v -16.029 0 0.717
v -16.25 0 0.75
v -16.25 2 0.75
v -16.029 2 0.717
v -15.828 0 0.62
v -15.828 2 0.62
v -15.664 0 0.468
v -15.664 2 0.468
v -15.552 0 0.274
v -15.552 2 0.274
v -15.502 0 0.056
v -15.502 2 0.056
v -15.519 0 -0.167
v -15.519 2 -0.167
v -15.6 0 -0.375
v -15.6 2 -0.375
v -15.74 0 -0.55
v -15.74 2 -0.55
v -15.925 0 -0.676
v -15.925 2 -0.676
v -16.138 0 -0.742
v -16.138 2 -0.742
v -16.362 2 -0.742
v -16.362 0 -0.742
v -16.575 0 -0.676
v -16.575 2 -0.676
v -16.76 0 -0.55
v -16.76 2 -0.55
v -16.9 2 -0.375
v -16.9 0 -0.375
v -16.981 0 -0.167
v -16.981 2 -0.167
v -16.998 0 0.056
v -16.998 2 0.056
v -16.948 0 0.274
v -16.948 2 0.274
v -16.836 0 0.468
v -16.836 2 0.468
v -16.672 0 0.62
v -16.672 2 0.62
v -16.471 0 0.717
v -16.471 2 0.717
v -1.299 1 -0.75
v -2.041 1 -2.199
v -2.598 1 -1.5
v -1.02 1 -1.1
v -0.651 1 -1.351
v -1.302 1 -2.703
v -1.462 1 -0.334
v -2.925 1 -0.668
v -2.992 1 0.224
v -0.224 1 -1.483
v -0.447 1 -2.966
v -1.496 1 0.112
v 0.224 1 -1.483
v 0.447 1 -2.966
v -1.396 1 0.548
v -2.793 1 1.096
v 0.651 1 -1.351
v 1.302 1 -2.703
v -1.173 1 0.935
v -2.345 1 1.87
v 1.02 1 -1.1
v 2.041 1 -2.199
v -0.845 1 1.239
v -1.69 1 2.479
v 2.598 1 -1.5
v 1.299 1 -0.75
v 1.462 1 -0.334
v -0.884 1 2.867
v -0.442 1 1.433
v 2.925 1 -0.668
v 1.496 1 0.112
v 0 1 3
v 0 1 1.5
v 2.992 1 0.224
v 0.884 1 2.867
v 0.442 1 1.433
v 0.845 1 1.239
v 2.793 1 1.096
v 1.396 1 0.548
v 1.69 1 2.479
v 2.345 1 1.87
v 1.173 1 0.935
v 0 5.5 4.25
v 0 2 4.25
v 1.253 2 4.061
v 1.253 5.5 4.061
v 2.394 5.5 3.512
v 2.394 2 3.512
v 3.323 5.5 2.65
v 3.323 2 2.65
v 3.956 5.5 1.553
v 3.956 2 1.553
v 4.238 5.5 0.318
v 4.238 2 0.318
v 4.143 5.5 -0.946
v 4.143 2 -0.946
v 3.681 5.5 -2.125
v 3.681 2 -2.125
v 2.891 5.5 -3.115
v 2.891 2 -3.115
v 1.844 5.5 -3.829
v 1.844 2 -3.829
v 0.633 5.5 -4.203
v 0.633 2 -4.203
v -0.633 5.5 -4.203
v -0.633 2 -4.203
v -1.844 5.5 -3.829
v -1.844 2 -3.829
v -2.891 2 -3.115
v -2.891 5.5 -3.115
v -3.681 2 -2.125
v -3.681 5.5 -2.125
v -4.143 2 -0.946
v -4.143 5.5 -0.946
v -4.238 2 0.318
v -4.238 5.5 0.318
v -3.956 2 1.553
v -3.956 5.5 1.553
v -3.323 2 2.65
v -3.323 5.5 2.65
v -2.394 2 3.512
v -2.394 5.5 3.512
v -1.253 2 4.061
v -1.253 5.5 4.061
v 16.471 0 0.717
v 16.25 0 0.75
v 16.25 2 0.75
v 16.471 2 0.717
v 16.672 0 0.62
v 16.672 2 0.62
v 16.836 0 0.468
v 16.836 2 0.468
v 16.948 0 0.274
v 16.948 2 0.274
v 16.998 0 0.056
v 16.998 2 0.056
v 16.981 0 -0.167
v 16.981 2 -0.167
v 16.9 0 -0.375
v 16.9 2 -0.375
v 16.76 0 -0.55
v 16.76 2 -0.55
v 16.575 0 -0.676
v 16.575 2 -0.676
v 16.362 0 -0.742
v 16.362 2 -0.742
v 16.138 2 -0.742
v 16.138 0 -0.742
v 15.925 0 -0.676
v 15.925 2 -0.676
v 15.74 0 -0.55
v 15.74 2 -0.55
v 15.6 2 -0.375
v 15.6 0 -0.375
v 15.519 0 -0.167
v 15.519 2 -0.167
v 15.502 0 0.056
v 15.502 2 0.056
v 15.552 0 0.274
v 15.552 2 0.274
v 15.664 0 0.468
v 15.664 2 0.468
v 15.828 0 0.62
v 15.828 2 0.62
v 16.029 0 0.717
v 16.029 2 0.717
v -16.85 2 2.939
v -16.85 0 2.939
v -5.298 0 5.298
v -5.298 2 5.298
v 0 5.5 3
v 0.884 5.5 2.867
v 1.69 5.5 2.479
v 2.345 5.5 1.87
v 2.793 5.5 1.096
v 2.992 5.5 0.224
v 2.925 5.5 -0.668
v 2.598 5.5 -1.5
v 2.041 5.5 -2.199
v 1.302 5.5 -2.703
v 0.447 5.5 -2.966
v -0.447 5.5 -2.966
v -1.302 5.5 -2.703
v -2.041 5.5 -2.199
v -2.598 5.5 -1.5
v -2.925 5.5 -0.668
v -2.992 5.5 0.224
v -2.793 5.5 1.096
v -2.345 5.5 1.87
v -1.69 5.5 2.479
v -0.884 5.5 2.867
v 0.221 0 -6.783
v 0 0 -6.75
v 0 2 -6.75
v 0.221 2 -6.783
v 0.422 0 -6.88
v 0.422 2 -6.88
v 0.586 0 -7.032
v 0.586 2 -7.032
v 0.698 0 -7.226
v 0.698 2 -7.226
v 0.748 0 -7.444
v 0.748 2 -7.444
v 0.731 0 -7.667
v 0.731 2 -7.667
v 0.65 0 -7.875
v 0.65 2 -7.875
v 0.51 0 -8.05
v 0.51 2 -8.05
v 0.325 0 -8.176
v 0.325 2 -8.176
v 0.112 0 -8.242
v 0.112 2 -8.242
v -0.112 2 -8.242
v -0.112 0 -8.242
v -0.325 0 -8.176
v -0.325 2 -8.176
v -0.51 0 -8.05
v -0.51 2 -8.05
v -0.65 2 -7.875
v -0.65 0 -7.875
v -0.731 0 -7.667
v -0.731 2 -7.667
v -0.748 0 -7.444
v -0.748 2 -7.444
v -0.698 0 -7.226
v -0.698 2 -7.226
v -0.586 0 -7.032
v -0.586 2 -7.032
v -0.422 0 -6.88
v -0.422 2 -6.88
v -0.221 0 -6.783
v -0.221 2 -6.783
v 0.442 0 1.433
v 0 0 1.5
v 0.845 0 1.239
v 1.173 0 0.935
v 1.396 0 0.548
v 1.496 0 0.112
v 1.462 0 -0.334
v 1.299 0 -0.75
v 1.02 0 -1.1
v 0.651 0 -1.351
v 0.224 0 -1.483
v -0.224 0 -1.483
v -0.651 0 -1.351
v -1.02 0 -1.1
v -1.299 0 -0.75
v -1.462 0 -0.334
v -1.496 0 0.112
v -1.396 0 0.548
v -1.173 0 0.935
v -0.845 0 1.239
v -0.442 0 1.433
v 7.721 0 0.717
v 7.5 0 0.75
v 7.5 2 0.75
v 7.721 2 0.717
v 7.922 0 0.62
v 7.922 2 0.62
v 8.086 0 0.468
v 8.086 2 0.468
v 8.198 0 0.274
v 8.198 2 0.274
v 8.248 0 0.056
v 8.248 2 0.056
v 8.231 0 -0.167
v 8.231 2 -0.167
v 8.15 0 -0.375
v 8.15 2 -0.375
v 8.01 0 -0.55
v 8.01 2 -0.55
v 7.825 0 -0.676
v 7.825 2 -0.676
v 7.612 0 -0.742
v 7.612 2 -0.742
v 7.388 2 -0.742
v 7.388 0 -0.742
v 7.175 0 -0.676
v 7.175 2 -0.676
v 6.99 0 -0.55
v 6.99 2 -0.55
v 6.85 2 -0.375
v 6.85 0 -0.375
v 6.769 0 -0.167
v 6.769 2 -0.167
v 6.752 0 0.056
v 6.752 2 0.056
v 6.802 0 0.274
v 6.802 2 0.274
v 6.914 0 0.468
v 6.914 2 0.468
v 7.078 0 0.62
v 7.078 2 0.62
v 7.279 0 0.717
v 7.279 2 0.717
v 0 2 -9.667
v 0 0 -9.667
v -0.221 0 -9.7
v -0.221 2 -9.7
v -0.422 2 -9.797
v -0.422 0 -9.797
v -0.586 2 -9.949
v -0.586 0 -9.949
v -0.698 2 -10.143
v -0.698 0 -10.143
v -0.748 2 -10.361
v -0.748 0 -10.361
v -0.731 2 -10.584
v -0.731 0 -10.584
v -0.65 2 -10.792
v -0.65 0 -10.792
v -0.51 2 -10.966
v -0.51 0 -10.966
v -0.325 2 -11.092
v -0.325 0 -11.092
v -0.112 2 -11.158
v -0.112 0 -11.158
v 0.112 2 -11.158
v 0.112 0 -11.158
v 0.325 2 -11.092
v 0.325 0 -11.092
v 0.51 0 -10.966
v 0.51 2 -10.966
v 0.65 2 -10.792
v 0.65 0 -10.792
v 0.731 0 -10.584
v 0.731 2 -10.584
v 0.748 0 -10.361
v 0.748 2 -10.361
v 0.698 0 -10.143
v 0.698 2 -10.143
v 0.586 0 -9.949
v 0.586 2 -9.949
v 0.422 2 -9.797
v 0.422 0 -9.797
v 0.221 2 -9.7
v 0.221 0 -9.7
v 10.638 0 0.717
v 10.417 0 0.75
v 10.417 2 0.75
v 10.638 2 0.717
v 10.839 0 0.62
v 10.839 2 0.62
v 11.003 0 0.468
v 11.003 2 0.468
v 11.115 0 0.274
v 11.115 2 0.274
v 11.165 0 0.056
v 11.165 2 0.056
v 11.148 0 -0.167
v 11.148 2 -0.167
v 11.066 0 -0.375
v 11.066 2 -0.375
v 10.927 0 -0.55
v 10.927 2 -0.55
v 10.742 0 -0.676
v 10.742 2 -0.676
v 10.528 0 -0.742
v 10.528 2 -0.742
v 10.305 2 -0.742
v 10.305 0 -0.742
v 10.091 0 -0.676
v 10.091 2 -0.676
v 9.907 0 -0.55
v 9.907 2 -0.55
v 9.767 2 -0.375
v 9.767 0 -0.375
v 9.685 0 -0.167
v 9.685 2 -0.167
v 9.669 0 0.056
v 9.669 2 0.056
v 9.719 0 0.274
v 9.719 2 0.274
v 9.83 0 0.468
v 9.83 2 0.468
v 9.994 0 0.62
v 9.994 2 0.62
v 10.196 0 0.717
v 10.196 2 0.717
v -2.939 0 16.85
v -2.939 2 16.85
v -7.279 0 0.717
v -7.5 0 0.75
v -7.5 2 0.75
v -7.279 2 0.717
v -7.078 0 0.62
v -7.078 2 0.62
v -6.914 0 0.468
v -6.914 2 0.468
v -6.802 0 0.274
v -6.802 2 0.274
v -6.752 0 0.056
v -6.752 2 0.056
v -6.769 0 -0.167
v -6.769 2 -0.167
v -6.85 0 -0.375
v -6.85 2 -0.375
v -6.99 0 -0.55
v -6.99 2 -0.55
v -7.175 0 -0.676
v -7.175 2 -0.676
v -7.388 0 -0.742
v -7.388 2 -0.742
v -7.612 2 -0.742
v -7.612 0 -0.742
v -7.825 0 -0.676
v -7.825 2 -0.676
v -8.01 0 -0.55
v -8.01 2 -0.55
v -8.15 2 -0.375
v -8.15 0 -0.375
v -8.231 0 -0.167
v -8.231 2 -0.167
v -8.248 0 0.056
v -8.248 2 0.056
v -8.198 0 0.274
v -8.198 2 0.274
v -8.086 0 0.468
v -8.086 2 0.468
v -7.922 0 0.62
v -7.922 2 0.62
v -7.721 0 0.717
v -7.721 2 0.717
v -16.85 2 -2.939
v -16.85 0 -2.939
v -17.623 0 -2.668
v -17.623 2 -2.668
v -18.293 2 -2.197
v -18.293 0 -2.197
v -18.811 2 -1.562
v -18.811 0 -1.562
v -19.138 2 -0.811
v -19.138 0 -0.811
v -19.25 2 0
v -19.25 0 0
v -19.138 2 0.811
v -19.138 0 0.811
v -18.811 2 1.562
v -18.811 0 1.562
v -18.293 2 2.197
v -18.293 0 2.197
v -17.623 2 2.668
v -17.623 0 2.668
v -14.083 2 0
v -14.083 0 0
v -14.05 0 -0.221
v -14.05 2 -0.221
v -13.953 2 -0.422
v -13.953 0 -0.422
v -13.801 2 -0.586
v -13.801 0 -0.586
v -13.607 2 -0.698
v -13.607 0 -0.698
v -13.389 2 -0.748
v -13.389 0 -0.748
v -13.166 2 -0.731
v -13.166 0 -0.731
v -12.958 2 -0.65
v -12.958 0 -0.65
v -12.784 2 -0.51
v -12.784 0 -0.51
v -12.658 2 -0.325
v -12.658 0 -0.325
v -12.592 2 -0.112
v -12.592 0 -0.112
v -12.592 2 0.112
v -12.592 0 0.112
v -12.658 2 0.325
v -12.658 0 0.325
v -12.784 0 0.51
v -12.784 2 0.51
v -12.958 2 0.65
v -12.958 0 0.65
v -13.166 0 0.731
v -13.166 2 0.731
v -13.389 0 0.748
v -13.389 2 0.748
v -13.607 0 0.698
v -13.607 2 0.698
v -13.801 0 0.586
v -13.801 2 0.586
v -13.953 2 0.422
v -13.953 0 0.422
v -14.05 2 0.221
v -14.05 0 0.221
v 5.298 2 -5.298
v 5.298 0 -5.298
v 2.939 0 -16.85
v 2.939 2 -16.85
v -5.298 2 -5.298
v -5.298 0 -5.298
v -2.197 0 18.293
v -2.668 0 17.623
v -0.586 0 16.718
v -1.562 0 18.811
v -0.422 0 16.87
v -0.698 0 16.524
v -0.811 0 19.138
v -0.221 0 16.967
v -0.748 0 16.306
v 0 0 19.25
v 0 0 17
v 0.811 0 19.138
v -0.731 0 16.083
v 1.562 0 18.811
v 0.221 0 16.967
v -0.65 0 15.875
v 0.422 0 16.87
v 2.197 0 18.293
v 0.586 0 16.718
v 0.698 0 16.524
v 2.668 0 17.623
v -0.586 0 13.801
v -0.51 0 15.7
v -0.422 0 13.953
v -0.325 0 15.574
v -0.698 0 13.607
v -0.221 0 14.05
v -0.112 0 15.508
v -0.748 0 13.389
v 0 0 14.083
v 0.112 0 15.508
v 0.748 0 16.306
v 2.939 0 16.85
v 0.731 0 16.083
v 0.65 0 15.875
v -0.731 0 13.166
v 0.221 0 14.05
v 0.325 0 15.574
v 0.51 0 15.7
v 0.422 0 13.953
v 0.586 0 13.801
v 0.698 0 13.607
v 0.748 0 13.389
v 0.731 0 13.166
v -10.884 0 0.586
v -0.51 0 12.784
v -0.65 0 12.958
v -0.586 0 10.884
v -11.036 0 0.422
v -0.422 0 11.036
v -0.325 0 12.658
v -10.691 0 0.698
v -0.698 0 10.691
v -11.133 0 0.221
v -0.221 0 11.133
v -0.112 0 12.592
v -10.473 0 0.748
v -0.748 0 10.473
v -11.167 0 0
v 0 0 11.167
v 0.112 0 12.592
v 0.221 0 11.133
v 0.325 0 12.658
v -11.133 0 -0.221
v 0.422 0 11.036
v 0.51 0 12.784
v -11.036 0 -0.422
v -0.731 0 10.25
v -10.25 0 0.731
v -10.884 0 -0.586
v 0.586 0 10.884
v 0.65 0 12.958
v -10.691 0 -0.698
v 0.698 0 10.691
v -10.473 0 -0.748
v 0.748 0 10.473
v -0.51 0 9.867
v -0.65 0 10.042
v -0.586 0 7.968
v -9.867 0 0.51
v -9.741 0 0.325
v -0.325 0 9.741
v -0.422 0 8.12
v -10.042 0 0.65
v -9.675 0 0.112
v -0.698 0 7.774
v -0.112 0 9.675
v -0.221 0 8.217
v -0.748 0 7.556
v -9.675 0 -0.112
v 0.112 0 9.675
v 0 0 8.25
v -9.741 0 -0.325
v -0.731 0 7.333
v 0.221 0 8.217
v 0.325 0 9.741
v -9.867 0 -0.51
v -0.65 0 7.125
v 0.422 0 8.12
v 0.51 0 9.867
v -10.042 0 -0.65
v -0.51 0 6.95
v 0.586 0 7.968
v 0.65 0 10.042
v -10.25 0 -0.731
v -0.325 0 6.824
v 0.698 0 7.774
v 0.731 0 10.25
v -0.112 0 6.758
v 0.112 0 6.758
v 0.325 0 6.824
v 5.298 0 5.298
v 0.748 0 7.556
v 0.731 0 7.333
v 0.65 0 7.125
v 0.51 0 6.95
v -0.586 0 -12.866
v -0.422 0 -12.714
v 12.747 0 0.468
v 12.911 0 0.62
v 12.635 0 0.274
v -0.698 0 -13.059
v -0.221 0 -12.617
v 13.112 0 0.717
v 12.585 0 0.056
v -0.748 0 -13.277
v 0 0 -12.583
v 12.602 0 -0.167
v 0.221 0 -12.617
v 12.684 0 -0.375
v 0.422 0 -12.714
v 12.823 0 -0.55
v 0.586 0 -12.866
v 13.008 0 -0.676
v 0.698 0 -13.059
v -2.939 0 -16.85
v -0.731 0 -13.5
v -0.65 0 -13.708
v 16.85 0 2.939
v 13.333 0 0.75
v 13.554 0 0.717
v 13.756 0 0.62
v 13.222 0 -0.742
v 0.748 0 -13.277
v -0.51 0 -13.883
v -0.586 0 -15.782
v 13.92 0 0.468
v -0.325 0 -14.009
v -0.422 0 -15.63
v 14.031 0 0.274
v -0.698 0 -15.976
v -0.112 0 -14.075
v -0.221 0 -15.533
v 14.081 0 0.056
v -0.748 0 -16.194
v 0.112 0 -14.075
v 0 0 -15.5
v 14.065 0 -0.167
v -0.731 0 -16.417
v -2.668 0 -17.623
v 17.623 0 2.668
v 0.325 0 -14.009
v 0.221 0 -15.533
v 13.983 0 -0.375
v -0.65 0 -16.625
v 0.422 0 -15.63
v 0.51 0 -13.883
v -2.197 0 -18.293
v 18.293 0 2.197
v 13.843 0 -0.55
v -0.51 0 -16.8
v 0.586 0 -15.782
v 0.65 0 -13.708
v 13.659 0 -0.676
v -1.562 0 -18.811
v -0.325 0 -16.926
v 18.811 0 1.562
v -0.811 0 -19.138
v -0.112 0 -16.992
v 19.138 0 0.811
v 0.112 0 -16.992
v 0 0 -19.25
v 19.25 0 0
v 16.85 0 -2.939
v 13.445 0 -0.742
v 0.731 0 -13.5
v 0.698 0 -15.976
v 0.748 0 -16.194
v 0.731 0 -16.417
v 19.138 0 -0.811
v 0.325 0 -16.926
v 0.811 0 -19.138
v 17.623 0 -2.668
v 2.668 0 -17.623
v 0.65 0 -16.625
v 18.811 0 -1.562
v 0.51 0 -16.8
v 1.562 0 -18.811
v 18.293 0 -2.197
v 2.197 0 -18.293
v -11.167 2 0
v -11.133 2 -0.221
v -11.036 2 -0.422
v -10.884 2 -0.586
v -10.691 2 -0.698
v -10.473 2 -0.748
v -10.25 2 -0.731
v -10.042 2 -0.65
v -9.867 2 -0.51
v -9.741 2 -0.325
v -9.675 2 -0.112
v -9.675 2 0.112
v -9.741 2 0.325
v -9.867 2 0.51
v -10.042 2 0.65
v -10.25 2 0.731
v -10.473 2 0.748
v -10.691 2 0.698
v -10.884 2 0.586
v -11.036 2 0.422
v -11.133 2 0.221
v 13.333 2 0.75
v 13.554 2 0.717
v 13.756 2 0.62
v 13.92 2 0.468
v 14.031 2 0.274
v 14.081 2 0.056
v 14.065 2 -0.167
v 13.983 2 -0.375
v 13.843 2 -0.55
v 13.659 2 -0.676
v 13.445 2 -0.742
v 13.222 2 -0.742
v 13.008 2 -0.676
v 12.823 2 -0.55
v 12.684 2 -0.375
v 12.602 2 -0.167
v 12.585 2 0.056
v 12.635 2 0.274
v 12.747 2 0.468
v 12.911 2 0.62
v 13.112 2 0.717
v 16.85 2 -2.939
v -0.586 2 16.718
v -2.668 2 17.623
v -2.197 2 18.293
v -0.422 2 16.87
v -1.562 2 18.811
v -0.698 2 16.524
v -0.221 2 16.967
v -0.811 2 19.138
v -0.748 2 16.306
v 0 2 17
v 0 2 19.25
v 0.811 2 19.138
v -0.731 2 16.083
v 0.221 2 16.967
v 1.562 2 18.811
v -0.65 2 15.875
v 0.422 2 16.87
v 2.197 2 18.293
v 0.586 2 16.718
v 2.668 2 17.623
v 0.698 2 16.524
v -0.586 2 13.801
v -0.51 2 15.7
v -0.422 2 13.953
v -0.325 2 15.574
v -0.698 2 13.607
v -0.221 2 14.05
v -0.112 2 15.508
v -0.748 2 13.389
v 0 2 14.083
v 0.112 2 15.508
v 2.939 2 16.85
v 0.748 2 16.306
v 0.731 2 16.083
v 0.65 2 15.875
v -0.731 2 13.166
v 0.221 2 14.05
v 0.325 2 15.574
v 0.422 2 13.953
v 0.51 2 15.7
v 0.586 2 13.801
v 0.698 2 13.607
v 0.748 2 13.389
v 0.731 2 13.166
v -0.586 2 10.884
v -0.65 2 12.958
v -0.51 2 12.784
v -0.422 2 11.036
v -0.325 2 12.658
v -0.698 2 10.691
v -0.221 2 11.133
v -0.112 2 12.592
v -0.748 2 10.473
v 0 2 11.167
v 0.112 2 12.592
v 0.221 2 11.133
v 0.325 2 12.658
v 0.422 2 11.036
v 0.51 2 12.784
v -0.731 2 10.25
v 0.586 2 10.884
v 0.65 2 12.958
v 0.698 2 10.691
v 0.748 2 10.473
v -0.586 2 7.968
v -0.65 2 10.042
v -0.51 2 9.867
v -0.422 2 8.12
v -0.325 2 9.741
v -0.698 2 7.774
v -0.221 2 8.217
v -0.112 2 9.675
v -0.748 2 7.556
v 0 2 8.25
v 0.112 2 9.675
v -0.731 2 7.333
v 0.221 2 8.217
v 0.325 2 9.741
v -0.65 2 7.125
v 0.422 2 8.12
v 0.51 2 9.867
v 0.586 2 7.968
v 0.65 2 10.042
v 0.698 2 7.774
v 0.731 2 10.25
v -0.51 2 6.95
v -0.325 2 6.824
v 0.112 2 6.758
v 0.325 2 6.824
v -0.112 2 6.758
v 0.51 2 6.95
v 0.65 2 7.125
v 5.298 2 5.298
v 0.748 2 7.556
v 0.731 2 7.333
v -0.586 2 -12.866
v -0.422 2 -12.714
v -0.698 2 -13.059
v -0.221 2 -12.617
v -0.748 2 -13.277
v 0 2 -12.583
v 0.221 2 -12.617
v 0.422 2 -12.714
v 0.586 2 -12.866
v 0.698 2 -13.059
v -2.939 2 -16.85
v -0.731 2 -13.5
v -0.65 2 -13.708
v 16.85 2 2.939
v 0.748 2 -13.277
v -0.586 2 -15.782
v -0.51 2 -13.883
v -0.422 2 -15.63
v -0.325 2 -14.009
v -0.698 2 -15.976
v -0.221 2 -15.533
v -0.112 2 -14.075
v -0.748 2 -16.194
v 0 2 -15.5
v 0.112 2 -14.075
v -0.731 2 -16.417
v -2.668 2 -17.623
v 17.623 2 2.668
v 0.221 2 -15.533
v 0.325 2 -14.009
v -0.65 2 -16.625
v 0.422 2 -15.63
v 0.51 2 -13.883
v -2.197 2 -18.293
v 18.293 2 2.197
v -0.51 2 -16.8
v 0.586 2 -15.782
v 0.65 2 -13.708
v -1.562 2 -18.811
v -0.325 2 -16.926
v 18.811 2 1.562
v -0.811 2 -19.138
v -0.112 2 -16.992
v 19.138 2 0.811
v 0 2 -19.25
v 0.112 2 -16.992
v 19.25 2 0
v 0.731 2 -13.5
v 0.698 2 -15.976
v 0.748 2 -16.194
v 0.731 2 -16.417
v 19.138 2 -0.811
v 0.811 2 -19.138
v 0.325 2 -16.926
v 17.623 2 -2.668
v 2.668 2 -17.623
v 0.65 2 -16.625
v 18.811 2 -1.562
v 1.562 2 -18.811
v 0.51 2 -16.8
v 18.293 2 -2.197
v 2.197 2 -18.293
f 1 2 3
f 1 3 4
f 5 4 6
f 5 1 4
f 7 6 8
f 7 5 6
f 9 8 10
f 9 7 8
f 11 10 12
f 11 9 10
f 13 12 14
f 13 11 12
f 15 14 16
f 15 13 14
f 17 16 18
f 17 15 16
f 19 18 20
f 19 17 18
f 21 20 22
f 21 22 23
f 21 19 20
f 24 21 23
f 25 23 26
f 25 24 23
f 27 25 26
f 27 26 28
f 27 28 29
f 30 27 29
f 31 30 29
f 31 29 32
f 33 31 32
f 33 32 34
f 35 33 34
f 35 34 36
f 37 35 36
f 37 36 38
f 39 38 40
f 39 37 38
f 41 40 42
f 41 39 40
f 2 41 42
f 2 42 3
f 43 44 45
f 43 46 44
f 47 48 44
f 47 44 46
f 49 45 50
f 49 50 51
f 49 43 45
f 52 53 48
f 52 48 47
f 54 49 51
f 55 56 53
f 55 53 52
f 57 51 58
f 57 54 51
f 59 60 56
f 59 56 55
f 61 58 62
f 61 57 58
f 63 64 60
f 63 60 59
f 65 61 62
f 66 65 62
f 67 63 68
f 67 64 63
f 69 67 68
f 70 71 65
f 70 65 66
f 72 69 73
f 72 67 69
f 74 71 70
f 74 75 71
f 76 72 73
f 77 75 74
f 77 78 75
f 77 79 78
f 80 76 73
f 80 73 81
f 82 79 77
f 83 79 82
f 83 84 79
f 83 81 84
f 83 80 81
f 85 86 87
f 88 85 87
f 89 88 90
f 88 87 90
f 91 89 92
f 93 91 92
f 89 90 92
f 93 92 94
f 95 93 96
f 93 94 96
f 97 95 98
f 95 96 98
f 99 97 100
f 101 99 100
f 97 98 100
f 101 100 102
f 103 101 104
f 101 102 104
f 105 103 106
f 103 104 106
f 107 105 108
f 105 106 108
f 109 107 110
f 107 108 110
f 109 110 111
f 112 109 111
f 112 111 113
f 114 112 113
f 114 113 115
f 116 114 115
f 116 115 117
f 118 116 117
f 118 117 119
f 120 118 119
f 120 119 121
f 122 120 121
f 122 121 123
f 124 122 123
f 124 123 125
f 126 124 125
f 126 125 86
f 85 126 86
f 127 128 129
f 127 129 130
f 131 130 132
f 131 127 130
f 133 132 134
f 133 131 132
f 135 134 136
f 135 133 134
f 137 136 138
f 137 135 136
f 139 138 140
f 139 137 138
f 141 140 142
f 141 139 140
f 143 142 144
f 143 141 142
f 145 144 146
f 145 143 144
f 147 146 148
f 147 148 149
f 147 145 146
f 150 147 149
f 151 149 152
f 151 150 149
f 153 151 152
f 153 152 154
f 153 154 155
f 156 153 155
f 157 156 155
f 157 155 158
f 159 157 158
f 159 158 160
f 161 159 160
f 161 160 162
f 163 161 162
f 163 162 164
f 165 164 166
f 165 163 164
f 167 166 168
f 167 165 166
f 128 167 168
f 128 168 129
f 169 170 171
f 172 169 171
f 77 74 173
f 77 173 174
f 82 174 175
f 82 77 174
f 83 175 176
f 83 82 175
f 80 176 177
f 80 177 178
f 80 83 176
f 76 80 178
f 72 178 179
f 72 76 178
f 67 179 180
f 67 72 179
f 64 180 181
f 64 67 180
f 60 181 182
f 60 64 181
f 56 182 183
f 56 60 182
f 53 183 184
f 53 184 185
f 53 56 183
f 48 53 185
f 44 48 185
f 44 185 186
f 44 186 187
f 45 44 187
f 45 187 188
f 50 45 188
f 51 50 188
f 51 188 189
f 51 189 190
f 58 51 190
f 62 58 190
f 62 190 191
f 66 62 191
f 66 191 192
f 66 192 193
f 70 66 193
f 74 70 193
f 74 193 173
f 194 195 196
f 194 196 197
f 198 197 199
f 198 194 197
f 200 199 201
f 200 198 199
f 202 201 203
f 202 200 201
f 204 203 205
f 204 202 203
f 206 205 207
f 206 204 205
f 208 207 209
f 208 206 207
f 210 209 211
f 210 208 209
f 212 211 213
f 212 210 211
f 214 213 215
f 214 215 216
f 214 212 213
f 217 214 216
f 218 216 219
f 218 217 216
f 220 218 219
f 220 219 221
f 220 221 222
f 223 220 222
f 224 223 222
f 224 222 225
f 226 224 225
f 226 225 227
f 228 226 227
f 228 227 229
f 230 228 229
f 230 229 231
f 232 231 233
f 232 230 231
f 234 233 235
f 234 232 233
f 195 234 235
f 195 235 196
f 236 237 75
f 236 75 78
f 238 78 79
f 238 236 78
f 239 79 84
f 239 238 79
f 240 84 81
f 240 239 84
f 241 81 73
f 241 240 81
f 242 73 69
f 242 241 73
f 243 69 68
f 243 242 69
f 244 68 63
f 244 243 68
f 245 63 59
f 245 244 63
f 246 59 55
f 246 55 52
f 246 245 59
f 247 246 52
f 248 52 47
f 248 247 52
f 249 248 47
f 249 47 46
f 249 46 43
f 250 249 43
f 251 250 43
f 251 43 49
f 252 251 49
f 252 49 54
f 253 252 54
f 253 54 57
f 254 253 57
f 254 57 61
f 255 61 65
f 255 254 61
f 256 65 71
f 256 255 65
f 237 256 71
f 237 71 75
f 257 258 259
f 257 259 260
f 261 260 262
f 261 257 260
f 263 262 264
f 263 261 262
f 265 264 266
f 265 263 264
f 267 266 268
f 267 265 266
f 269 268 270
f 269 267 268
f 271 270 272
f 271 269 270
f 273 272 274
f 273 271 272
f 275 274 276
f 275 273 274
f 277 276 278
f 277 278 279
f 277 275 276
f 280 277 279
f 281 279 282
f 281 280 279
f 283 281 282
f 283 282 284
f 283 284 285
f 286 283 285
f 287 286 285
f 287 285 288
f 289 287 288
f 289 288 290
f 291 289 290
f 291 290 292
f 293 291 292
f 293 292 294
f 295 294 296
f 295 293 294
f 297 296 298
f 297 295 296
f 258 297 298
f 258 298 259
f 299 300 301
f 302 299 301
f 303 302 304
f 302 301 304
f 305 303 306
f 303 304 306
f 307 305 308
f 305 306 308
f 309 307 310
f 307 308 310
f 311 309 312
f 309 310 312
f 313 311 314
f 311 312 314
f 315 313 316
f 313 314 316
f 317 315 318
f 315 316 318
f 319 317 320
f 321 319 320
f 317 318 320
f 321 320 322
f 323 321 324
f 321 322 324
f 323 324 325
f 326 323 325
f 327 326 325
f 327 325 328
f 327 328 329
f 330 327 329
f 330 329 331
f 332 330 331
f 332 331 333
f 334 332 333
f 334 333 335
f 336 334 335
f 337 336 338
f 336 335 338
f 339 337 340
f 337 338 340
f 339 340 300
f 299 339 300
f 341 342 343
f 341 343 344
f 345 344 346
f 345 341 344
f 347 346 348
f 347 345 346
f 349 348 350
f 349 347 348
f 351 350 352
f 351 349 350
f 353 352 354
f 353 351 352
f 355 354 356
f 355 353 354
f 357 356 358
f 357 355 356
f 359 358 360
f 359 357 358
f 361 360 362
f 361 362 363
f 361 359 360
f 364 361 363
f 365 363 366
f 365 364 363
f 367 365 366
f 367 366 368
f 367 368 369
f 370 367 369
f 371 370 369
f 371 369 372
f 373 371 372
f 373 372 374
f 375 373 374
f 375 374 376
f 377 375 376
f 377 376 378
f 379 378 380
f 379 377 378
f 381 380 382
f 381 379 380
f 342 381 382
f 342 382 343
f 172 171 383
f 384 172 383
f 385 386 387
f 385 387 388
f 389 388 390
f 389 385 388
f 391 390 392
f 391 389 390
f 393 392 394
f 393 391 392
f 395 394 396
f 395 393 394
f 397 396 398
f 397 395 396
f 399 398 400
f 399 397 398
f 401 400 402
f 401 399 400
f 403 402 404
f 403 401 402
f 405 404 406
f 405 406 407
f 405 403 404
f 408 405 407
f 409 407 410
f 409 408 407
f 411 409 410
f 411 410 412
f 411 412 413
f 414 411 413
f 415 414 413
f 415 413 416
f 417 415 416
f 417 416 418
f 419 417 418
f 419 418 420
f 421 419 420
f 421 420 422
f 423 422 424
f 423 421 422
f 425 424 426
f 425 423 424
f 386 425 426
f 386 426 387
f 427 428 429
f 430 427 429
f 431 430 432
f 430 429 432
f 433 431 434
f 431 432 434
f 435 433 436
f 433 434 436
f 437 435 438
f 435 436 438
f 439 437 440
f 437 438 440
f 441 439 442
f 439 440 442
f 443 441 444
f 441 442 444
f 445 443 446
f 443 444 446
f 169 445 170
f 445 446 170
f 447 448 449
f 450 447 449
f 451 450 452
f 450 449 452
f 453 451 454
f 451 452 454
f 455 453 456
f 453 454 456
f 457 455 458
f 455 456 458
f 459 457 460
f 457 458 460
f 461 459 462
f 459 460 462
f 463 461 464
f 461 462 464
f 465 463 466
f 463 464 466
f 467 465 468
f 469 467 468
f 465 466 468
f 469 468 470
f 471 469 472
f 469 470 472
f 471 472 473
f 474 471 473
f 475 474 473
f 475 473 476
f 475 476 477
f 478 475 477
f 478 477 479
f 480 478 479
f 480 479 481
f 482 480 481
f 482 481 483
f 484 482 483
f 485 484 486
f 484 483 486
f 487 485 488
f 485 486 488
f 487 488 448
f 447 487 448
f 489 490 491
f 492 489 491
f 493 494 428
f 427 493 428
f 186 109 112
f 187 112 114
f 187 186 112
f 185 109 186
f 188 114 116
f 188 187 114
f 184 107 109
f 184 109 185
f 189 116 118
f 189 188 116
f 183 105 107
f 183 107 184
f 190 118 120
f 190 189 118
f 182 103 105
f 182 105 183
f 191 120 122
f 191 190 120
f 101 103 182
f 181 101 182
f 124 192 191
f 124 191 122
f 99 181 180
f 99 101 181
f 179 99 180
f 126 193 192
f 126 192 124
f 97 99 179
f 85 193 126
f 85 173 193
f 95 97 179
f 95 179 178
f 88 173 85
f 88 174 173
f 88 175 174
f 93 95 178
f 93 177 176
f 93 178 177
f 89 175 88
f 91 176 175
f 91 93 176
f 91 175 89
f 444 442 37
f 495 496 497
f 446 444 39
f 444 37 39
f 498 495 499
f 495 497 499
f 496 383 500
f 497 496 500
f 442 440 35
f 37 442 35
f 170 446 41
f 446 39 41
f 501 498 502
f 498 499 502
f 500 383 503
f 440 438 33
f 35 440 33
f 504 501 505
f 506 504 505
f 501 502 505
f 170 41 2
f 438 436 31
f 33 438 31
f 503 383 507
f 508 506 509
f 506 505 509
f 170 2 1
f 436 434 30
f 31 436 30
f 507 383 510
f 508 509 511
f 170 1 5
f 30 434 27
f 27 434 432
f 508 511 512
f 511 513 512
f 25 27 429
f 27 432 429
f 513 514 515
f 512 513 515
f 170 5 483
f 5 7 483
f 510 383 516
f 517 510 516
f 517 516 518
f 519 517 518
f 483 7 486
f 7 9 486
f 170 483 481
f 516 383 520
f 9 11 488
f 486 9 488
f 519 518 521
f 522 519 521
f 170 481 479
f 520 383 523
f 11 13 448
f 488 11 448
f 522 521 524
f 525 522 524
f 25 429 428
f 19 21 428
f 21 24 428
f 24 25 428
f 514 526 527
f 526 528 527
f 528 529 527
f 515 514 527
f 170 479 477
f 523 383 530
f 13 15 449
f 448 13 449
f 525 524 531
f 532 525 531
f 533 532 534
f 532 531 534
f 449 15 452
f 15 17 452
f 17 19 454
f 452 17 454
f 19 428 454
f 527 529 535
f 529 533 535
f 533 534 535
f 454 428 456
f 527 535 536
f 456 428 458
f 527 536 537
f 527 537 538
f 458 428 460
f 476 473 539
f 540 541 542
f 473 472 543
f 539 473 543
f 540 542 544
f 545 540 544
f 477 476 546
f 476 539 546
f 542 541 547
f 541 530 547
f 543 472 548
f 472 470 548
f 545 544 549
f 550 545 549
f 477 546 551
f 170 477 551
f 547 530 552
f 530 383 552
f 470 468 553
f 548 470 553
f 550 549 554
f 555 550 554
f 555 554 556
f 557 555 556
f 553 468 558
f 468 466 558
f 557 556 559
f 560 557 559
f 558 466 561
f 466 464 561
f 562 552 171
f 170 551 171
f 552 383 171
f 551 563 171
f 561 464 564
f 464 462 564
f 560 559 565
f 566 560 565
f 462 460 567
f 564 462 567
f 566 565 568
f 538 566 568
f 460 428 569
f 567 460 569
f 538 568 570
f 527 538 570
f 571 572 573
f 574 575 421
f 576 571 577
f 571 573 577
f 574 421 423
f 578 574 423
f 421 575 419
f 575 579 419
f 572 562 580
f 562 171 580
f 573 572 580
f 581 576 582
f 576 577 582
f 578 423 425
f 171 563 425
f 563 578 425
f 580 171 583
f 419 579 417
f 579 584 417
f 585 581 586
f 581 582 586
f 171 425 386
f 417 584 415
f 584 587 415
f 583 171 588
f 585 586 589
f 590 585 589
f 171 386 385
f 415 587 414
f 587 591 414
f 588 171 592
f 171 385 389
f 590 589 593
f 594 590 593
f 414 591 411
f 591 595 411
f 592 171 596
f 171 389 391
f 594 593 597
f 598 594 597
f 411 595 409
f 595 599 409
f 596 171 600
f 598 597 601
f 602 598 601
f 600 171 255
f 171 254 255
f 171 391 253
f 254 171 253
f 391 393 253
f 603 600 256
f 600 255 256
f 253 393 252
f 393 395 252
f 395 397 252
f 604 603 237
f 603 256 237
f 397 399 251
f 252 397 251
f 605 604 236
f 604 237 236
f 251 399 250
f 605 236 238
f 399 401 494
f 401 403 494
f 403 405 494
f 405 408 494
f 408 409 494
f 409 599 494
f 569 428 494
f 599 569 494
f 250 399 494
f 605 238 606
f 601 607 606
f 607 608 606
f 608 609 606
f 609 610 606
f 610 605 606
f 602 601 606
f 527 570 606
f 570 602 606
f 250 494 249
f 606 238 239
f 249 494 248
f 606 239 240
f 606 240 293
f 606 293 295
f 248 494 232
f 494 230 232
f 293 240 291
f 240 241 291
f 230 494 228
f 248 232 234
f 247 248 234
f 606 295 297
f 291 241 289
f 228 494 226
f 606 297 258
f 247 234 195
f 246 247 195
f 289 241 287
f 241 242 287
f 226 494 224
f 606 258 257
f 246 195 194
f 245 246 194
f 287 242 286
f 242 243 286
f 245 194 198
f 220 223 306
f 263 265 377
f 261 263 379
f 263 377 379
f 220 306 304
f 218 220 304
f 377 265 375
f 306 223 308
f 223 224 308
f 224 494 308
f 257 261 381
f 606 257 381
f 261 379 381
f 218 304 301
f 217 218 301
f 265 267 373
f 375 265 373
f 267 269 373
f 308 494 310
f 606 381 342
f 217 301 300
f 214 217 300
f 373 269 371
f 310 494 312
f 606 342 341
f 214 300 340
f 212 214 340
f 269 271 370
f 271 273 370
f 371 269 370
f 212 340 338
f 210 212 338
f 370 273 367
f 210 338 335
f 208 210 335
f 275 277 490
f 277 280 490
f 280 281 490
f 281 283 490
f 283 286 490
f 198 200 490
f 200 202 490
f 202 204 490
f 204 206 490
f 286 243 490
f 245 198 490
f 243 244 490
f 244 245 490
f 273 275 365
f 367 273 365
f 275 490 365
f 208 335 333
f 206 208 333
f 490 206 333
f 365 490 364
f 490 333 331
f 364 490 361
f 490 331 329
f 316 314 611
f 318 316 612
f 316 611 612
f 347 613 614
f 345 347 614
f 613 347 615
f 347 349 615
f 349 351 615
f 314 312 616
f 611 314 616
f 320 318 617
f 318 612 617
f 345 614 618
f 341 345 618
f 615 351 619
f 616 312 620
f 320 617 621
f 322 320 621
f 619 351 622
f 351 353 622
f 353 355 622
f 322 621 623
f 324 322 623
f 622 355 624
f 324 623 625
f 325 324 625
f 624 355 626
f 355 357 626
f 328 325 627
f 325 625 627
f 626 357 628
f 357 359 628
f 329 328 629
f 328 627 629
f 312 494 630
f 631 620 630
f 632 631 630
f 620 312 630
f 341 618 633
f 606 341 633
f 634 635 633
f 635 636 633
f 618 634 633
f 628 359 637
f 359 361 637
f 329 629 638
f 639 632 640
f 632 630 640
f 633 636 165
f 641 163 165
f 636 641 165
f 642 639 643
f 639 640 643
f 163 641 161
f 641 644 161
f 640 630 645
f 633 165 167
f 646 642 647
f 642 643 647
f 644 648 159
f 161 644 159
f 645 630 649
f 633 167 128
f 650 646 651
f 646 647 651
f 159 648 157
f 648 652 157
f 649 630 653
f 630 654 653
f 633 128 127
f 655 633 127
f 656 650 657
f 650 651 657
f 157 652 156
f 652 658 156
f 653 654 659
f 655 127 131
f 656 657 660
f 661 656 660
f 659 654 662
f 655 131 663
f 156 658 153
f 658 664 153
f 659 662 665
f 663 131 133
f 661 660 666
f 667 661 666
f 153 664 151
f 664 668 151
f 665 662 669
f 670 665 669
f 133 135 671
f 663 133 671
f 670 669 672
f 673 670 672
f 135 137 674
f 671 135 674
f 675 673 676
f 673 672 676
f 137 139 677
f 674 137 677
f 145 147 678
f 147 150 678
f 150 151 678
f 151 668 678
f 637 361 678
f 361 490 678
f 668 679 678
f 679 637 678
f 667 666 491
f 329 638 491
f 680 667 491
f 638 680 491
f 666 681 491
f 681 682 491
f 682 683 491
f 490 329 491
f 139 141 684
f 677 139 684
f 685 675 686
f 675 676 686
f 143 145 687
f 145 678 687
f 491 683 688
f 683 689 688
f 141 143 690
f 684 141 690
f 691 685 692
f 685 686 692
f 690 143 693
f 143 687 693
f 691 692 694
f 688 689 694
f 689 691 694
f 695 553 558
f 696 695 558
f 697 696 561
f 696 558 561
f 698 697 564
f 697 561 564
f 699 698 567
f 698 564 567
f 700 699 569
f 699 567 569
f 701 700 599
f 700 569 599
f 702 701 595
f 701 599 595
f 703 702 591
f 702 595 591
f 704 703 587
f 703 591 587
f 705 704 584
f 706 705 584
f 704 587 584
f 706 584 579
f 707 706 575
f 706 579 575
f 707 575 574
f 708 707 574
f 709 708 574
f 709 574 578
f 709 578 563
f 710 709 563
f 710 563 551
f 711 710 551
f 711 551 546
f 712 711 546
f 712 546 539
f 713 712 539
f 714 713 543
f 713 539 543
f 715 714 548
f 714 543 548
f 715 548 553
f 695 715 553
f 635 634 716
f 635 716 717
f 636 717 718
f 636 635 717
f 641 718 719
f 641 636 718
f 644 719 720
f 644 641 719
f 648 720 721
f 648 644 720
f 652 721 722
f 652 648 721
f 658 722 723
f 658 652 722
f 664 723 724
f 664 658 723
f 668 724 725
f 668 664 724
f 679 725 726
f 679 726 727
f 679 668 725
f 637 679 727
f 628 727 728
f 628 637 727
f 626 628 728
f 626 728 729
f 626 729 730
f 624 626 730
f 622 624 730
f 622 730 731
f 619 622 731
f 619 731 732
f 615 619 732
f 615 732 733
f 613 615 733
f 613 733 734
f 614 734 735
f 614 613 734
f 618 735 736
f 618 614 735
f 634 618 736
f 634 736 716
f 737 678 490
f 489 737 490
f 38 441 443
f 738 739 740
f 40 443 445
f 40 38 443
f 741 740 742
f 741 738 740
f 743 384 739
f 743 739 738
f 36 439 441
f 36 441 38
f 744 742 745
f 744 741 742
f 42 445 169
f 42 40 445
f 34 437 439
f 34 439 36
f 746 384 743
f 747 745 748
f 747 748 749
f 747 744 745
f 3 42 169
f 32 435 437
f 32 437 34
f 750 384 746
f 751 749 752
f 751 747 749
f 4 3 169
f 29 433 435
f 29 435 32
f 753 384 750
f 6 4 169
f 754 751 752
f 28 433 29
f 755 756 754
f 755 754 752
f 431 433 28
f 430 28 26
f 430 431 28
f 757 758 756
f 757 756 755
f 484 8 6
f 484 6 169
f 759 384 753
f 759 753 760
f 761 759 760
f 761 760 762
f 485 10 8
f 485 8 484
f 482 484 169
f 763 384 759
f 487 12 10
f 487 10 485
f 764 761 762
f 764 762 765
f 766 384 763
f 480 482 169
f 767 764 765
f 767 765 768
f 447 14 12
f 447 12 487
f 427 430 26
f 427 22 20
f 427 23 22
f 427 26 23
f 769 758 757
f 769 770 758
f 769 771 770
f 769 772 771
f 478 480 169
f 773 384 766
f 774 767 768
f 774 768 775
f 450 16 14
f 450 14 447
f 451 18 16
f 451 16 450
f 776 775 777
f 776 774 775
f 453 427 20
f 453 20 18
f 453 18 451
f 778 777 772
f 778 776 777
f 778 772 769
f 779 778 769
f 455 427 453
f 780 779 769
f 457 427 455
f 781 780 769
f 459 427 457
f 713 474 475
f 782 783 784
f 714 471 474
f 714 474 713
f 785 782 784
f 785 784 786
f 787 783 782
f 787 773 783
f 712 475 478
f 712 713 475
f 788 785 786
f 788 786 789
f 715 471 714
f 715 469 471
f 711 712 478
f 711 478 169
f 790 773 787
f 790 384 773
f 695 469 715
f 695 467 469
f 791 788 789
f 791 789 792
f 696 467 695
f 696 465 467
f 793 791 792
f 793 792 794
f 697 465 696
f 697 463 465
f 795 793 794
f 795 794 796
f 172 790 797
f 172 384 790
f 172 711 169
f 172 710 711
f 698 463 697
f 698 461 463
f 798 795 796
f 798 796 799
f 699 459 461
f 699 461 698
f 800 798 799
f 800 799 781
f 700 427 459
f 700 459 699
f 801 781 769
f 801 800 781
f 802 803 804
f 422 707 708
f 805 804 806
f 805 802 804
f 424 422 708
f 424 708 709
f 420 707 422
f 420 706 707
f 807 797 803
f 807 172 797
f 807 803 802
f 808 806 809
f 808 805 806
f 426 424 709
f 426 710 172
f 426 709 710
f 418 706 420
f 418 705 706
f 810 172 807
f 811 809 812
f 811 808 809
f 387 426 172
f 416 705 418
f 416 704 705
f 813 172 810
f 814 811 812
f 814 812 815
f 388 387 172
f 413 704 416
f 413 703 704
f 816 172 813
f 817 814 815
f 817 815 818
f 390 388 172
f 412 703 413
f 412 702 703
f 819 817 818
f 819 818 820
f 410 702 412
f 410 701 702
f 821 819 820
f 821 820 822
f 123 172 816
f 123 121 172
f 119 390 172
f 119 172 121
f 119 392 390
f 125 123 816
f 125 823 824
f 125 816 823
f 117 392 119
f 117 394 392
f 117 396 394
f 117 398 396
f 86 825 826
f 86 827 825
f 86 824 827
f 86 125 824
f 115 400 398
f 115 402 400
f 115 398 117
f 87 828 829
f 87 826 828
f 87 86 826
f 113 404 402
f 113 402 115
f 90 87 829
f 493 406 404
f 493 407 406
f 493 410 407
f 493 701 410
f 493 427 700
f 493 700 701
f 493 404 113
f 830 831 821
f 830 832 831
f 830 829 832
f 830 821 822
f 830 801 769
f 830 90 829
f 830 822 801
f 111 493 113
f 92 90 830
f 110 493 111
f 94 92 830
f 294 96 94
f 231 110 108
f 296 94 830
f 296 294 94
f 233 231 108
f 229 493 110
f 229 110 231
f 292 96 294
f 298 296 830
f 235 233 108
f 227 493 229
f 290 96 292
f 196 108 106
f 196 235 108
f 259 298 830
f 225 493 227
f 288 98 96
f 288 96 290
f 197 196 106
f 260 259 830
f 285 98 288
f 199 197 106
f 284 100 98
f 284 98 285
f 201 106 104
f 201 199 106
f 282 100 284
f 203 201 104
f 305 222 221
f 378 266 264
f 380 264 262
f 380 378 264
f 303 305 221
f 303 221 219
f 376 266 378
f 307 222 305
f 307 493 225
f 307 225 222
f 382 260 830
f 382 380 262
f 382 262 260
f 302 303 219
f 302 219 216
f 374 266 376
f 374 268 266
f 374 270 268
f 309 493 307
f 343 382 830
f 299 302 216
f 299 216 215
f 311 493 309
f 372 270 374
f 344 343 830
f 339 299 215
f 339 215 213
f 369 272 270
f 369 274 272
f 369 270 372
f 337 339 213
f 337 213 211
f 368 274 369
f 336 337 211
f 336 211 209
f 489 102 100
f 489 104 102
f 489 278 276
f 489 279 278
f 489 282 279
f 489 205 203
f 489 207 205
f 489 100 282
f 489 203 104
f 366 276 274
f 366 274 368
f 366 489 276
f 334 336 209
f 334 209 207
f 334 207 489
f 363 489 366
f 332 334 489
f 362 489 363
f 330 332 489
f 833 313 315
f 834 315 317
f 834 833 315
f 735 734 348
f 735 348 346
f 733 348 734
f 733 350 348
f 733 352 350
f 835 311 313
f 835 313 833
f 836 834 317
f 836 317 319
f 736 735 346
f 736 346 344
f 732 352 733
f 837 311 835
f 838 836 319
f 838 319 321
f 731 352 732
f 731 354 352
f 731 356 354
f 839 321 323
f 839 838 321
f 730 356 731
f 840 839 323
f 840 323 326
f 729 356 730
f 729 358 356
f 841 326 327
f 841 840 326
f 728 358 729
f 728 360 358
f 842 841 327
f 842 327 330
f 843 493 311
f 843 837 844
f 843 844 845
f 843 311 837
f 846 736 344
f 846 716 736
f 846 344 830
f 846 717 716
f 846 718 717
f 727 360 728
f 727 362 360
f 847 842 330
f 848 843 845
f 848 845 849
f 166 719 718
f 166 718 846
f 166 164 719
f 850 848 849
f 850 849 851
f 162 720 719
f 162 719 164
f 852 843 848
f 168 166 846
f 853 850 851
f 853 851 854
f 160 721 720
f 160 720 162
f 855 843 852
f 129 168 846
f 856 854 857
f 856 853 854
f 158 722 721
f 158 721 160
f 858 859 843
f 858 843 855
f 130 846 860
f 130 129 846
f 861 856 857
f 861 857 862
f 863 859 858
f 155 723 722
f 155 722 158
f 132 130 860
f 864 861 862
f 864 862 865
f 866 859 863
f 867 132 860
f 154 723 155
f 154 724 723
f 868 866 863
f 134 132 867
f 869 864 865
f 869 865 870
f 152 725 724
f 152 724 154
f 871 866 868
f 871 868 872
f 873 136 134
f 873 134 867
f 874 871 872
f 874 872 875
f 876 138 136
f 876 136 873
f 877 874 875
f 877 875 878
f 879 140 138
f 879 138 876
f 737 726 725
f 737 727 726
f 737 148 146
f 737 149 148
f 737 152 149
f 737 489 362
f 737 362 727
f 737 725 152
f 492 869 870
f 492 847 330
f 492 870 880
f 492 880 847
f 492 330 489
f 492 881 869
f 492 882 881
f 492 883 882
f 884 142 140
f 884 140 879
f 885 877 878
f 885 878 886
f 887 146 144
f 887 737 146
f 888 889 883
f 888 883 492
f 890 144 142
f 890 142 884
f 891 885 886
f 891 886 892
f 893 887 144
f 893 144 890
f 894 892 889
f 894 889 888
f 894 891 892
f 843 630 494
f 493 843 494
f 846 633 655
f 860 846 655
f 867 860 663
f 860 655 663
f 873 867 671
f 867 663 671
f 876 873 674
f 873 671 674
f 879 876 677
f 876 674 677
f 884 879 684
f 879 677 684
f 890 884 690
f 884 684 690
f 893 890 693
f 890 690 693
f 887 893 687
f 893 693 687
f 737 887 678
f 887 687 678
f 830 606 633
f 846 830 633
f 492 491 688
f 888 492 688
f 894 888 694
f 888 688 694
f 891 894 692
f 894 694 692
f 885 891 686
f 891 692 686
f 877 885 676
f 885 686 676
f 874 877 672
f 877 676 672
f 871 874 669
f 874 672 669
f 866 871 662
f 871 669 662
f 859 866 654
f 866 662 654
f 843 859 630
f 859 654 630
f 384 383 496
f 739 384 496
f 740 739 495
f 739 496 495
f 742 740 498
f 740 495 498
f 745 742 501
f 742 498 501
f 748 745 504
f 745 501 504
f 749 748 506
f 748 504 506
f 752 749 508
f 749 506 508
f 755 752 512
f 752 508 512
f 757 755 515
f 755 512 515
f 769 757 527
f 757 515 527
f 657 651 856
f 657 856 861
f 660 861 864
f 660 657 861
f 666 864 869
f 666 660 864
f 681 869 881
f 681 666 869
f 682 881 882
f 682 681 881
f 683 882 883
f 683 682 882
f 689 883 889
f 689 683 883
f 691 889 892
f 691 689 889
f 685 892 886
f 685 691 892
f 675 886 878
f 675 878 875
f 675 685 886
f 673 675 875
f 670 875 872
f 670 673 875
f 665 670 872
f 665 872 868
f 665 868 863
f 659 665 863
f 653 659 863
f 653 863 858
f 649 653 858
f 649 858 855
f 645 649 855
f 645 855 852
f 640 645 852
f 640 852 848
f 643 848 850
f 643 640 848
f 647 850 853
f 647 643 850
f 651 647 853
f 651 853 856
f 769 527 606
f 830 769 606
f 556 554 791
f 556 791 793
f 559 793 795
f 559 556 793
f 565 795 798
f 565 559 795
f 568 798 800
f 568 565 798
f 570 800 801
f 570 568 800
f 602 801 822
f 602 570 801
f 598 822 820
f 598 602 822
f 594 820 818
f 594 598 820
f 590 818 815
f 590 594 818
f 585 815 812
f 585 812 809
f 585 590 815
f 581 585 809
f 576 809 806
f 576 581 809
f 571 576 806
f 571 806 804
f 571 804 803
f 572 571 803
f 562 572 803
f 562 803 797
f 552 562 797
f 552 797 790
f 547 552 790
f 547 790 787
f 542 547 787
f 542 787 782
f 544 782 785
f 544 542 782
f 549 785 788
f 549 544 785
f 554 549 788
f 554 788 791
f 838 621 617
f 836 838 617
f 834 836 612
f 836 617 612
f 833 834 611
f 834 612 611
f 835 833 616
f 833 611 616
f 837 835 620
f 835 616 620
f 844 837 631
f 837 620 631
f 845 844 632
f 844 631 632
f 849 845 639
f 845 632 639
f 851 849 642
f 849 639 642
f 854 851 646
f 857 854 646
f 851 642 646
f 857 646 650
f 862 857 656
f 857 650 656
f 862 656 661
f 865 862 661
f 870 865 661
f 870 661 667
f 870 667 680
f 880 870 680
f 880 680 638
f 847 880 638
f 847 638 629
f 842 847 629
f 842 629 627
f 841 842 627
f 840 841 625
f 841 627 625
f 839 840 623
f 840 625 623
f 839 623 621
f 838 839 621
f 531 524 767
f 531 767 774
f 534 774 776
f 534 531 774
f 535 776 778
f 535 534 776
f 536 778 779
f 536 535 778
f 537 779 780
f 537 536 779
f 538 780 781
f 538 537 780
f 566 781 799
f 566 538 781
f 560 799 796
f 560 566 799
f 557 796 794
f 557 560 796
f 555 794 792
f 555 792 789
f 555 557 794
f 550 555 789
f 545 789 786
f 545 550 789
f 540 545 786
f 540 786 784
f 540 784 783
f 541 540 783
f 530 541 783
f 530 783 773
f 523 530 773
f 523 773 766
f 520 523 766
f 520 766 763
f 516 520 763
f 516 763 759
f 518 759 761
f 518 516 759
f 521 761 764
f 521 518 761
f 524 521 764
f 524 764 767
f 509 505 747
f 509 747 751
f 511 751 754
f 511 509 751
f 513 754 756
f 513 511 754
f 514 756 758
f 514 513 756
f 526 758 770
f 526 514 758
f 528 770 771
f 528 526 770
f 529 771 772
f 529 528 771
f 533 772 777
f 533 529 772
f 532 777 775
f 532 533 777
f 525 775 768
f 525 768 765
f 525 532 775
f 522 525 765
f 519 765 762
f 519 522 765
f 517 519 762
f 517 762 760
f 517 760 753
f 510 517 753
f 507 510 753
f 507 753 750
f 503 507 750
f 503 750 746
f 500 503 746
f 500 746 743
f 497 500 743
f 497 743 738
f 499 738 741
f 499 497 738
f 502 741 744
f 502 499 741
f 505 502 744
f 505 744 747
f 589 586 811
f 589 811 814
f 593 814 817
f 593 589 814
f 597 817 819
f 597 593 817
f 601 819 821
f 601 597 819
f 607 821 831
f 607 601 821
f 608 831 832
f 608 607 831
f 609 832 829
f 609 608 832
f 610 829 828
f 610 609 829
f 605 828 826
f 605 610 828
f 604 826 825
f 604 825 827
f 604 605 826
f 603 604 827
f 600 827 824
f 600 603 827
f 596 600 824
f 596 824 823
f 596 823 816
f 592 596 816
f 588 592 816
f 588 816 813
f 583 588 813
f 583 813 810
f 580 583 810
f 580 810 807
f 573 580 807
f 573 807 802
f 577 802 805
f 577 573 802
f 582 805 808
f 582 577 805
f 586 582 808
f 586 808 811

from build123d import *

# Parameters (mm, degrees)
SKETCH_1_R      = 0.75
SKETCH_1_R_2    = 4.25
EXTRUDE_1_DEPTH = 2
SKETCH_1_3_R    = 3
SKETCH_1_3_R_2  = 1.5
EXTRUDE_2_DEPTH = 1
SKETCH_1_4_R    = 4.25
SKETCH_1_4_R_2  = 3
EXTRUDE_3_DEPTH = 5.5


with BuildPart() as part:
    # Эскиз1 → Бобышка-Вытянуть1 (new body)
    with BuildSketch(Plane(origin=(0, 0, 0), x_dir=(1, 0, 0), z_dir=(0, 1, 0))):
        with BuildLine():
            ThreePointArc((-16.85, 2.939387691), (-19.25, 0), (-16.85, -2.939387691))
            Line((-16.85, -2.939387691), (-5.297526475, -5.297526475))
            Line((-5.297526475, -5.297526475), (-2.939387691, -16.85))
            ThreePointArc((-2.939387691, -16.85), (0, -19.25), (2.939387691, -16.85))
            Line((2.939387691, -16.85), (5.297526475, -5.297526475))
            Line((5.297526475, -5.297526475), (16.85, -2.939387691))
            ThreePointArc((16.85, -2.939387691), (19.25, 0), (16.85, 2.939387691))
            Line((16.85, 2.939387691), (5.297526475, 5.297526475))
            Line((5.297526475, 5.297526475), (2.939387691, 16.85))
            ThreePointArc((2.939387691, 16.85), (0, 19.25), (-2.939387691, 16.85))
            Line((-2.939387691, 16.85), (-5.297526475, 5.297526475))
            Line((-5.297526475, 5.297526475), (-16.85, 2.939387691))
        make_face()
        with BuildLine():
            ThreePointArc((-14.083333333, 0), (-13.333333333, 0.75), (-12.583333333, 0))
            ThreePointArc((-12.583333333, 0), (-13.333333333, -0.75), (-14.083333333, 0))
        make_face(mode=Mode.SUBTRACT)
        with Locations((-16.25, 0)):
            Circle(SKETCH_1_R, mode=Mode.SUBTRACT)
        with BuildLine():
            ThreePointArc((-9.666666667, 0), (-10.416666667, -0.75), (-11.166666667, 0))
            ThreePointArc((-11.166666667, 0), (-10.416666667, 0.75), (-9.666666667, 0))
        make_face(mode=Mode.SUBTRACT)
        with Locations((-7.5, 0)):
            Circle(SKETCH_1_R, mode=Mode.SUBTRACT)
        Circle(SKETCH_1_R_2, mode=Mode.SUBTRACT)
        with BuildLine():
            ThreePointArc((0, 12.583333333), (-0.75, 13.333333333), (0, 14.083333333))
            ThreePointArc((0, 14.083333333), (0.75, 13.333333333), (0, 12.583333333))
        make_face(mode=Mode.SUBTRACT)
        with Locations((0, 7.5)):
            Circle(SKETCH_1_R, mode=Mode.SUBTRACT)
        with BuildLine():
            ThreePointArc((0, 9.666666667), (-0.75, 10.416666667), (0, 11.166666667))
            ThreePointArc((0, 11.166666667), (0.75, 10.416666667), (0, 9.666666667))
        make_face(mode=Mode.SUBTRACT)
        with Locations((13.333333333, 0)):
            Circle(SKETCH_1_R, mode=Mode.SUBTRACT)
        with Locations((7.5, 0)):
            Circle(SKETCH_1_R, mode=Mode.SUBTRACT)
        with Locations((10.416666667, 0)):
            Circle(SKETCH_1_R, mode=Mode.SUBTRACT)
        with Locations((0, -10.416666667)):
            Circle(SKETCH_1_R, mode=Mode.SUBTRACT)
        with Locations((0, -7.5)):
            Circle(SKETCH_1_R, mode=Mode.SUBTRACT)
        with Locations((0, -13.333333333)):
            Circle(SKETCH_1_R, mode=Mode.SUBTRACT)
        with Locations((0, 16.25)):
            Circle(SKETCH_1_R, mode=Mode.SUBTRACT)
        with Locations((16.25, 0)):
            Circle(SKETCH_1_R, mode=Mode.SUBTRACT)
        with Locations((0, -16.25)):
            Circle(SKETCH_1_R, mode=Mode.SUBTRACT)
    extrude(amount=EXTRUDE_1_DEPTH)



with BuildPart() as body_2:
    # Эскиз1<3> → Бобышка-Вытянуть2 (new body)
    with BuildSketch(Plane(origin=(0, 0, 0), x_dir=(1, 0, 0), z_dir=(0, 1, 0))):
        Circle(SKETCH_1_3_R)
        Circle(SKETCH_1_3_R_2, mode=Mode.SUBTRACT)
    extrude(amount=EXTRUDE_2_DEPTH)


with BuildPart() as part_1:
    add(part.part)

    add(body_2.part)  # Бобышка-Вытянуть3 merges body 2
    # Эскиз1<4> → Бобышка-Вытянуть3 (add)
    with BuildSketch(Plane(origin=(0, 0, 0), x_dir=(1, 0, 0), z_dir=(0, 1, 0))):
        Circle(SKETCH_1_4_R)
        Circle(SKETCH_1_4_R_2, mode=Mode.SUBTRACT)
    extrude(amount=EXTRUDE_3_DEPTH)


solid = part_1.part
